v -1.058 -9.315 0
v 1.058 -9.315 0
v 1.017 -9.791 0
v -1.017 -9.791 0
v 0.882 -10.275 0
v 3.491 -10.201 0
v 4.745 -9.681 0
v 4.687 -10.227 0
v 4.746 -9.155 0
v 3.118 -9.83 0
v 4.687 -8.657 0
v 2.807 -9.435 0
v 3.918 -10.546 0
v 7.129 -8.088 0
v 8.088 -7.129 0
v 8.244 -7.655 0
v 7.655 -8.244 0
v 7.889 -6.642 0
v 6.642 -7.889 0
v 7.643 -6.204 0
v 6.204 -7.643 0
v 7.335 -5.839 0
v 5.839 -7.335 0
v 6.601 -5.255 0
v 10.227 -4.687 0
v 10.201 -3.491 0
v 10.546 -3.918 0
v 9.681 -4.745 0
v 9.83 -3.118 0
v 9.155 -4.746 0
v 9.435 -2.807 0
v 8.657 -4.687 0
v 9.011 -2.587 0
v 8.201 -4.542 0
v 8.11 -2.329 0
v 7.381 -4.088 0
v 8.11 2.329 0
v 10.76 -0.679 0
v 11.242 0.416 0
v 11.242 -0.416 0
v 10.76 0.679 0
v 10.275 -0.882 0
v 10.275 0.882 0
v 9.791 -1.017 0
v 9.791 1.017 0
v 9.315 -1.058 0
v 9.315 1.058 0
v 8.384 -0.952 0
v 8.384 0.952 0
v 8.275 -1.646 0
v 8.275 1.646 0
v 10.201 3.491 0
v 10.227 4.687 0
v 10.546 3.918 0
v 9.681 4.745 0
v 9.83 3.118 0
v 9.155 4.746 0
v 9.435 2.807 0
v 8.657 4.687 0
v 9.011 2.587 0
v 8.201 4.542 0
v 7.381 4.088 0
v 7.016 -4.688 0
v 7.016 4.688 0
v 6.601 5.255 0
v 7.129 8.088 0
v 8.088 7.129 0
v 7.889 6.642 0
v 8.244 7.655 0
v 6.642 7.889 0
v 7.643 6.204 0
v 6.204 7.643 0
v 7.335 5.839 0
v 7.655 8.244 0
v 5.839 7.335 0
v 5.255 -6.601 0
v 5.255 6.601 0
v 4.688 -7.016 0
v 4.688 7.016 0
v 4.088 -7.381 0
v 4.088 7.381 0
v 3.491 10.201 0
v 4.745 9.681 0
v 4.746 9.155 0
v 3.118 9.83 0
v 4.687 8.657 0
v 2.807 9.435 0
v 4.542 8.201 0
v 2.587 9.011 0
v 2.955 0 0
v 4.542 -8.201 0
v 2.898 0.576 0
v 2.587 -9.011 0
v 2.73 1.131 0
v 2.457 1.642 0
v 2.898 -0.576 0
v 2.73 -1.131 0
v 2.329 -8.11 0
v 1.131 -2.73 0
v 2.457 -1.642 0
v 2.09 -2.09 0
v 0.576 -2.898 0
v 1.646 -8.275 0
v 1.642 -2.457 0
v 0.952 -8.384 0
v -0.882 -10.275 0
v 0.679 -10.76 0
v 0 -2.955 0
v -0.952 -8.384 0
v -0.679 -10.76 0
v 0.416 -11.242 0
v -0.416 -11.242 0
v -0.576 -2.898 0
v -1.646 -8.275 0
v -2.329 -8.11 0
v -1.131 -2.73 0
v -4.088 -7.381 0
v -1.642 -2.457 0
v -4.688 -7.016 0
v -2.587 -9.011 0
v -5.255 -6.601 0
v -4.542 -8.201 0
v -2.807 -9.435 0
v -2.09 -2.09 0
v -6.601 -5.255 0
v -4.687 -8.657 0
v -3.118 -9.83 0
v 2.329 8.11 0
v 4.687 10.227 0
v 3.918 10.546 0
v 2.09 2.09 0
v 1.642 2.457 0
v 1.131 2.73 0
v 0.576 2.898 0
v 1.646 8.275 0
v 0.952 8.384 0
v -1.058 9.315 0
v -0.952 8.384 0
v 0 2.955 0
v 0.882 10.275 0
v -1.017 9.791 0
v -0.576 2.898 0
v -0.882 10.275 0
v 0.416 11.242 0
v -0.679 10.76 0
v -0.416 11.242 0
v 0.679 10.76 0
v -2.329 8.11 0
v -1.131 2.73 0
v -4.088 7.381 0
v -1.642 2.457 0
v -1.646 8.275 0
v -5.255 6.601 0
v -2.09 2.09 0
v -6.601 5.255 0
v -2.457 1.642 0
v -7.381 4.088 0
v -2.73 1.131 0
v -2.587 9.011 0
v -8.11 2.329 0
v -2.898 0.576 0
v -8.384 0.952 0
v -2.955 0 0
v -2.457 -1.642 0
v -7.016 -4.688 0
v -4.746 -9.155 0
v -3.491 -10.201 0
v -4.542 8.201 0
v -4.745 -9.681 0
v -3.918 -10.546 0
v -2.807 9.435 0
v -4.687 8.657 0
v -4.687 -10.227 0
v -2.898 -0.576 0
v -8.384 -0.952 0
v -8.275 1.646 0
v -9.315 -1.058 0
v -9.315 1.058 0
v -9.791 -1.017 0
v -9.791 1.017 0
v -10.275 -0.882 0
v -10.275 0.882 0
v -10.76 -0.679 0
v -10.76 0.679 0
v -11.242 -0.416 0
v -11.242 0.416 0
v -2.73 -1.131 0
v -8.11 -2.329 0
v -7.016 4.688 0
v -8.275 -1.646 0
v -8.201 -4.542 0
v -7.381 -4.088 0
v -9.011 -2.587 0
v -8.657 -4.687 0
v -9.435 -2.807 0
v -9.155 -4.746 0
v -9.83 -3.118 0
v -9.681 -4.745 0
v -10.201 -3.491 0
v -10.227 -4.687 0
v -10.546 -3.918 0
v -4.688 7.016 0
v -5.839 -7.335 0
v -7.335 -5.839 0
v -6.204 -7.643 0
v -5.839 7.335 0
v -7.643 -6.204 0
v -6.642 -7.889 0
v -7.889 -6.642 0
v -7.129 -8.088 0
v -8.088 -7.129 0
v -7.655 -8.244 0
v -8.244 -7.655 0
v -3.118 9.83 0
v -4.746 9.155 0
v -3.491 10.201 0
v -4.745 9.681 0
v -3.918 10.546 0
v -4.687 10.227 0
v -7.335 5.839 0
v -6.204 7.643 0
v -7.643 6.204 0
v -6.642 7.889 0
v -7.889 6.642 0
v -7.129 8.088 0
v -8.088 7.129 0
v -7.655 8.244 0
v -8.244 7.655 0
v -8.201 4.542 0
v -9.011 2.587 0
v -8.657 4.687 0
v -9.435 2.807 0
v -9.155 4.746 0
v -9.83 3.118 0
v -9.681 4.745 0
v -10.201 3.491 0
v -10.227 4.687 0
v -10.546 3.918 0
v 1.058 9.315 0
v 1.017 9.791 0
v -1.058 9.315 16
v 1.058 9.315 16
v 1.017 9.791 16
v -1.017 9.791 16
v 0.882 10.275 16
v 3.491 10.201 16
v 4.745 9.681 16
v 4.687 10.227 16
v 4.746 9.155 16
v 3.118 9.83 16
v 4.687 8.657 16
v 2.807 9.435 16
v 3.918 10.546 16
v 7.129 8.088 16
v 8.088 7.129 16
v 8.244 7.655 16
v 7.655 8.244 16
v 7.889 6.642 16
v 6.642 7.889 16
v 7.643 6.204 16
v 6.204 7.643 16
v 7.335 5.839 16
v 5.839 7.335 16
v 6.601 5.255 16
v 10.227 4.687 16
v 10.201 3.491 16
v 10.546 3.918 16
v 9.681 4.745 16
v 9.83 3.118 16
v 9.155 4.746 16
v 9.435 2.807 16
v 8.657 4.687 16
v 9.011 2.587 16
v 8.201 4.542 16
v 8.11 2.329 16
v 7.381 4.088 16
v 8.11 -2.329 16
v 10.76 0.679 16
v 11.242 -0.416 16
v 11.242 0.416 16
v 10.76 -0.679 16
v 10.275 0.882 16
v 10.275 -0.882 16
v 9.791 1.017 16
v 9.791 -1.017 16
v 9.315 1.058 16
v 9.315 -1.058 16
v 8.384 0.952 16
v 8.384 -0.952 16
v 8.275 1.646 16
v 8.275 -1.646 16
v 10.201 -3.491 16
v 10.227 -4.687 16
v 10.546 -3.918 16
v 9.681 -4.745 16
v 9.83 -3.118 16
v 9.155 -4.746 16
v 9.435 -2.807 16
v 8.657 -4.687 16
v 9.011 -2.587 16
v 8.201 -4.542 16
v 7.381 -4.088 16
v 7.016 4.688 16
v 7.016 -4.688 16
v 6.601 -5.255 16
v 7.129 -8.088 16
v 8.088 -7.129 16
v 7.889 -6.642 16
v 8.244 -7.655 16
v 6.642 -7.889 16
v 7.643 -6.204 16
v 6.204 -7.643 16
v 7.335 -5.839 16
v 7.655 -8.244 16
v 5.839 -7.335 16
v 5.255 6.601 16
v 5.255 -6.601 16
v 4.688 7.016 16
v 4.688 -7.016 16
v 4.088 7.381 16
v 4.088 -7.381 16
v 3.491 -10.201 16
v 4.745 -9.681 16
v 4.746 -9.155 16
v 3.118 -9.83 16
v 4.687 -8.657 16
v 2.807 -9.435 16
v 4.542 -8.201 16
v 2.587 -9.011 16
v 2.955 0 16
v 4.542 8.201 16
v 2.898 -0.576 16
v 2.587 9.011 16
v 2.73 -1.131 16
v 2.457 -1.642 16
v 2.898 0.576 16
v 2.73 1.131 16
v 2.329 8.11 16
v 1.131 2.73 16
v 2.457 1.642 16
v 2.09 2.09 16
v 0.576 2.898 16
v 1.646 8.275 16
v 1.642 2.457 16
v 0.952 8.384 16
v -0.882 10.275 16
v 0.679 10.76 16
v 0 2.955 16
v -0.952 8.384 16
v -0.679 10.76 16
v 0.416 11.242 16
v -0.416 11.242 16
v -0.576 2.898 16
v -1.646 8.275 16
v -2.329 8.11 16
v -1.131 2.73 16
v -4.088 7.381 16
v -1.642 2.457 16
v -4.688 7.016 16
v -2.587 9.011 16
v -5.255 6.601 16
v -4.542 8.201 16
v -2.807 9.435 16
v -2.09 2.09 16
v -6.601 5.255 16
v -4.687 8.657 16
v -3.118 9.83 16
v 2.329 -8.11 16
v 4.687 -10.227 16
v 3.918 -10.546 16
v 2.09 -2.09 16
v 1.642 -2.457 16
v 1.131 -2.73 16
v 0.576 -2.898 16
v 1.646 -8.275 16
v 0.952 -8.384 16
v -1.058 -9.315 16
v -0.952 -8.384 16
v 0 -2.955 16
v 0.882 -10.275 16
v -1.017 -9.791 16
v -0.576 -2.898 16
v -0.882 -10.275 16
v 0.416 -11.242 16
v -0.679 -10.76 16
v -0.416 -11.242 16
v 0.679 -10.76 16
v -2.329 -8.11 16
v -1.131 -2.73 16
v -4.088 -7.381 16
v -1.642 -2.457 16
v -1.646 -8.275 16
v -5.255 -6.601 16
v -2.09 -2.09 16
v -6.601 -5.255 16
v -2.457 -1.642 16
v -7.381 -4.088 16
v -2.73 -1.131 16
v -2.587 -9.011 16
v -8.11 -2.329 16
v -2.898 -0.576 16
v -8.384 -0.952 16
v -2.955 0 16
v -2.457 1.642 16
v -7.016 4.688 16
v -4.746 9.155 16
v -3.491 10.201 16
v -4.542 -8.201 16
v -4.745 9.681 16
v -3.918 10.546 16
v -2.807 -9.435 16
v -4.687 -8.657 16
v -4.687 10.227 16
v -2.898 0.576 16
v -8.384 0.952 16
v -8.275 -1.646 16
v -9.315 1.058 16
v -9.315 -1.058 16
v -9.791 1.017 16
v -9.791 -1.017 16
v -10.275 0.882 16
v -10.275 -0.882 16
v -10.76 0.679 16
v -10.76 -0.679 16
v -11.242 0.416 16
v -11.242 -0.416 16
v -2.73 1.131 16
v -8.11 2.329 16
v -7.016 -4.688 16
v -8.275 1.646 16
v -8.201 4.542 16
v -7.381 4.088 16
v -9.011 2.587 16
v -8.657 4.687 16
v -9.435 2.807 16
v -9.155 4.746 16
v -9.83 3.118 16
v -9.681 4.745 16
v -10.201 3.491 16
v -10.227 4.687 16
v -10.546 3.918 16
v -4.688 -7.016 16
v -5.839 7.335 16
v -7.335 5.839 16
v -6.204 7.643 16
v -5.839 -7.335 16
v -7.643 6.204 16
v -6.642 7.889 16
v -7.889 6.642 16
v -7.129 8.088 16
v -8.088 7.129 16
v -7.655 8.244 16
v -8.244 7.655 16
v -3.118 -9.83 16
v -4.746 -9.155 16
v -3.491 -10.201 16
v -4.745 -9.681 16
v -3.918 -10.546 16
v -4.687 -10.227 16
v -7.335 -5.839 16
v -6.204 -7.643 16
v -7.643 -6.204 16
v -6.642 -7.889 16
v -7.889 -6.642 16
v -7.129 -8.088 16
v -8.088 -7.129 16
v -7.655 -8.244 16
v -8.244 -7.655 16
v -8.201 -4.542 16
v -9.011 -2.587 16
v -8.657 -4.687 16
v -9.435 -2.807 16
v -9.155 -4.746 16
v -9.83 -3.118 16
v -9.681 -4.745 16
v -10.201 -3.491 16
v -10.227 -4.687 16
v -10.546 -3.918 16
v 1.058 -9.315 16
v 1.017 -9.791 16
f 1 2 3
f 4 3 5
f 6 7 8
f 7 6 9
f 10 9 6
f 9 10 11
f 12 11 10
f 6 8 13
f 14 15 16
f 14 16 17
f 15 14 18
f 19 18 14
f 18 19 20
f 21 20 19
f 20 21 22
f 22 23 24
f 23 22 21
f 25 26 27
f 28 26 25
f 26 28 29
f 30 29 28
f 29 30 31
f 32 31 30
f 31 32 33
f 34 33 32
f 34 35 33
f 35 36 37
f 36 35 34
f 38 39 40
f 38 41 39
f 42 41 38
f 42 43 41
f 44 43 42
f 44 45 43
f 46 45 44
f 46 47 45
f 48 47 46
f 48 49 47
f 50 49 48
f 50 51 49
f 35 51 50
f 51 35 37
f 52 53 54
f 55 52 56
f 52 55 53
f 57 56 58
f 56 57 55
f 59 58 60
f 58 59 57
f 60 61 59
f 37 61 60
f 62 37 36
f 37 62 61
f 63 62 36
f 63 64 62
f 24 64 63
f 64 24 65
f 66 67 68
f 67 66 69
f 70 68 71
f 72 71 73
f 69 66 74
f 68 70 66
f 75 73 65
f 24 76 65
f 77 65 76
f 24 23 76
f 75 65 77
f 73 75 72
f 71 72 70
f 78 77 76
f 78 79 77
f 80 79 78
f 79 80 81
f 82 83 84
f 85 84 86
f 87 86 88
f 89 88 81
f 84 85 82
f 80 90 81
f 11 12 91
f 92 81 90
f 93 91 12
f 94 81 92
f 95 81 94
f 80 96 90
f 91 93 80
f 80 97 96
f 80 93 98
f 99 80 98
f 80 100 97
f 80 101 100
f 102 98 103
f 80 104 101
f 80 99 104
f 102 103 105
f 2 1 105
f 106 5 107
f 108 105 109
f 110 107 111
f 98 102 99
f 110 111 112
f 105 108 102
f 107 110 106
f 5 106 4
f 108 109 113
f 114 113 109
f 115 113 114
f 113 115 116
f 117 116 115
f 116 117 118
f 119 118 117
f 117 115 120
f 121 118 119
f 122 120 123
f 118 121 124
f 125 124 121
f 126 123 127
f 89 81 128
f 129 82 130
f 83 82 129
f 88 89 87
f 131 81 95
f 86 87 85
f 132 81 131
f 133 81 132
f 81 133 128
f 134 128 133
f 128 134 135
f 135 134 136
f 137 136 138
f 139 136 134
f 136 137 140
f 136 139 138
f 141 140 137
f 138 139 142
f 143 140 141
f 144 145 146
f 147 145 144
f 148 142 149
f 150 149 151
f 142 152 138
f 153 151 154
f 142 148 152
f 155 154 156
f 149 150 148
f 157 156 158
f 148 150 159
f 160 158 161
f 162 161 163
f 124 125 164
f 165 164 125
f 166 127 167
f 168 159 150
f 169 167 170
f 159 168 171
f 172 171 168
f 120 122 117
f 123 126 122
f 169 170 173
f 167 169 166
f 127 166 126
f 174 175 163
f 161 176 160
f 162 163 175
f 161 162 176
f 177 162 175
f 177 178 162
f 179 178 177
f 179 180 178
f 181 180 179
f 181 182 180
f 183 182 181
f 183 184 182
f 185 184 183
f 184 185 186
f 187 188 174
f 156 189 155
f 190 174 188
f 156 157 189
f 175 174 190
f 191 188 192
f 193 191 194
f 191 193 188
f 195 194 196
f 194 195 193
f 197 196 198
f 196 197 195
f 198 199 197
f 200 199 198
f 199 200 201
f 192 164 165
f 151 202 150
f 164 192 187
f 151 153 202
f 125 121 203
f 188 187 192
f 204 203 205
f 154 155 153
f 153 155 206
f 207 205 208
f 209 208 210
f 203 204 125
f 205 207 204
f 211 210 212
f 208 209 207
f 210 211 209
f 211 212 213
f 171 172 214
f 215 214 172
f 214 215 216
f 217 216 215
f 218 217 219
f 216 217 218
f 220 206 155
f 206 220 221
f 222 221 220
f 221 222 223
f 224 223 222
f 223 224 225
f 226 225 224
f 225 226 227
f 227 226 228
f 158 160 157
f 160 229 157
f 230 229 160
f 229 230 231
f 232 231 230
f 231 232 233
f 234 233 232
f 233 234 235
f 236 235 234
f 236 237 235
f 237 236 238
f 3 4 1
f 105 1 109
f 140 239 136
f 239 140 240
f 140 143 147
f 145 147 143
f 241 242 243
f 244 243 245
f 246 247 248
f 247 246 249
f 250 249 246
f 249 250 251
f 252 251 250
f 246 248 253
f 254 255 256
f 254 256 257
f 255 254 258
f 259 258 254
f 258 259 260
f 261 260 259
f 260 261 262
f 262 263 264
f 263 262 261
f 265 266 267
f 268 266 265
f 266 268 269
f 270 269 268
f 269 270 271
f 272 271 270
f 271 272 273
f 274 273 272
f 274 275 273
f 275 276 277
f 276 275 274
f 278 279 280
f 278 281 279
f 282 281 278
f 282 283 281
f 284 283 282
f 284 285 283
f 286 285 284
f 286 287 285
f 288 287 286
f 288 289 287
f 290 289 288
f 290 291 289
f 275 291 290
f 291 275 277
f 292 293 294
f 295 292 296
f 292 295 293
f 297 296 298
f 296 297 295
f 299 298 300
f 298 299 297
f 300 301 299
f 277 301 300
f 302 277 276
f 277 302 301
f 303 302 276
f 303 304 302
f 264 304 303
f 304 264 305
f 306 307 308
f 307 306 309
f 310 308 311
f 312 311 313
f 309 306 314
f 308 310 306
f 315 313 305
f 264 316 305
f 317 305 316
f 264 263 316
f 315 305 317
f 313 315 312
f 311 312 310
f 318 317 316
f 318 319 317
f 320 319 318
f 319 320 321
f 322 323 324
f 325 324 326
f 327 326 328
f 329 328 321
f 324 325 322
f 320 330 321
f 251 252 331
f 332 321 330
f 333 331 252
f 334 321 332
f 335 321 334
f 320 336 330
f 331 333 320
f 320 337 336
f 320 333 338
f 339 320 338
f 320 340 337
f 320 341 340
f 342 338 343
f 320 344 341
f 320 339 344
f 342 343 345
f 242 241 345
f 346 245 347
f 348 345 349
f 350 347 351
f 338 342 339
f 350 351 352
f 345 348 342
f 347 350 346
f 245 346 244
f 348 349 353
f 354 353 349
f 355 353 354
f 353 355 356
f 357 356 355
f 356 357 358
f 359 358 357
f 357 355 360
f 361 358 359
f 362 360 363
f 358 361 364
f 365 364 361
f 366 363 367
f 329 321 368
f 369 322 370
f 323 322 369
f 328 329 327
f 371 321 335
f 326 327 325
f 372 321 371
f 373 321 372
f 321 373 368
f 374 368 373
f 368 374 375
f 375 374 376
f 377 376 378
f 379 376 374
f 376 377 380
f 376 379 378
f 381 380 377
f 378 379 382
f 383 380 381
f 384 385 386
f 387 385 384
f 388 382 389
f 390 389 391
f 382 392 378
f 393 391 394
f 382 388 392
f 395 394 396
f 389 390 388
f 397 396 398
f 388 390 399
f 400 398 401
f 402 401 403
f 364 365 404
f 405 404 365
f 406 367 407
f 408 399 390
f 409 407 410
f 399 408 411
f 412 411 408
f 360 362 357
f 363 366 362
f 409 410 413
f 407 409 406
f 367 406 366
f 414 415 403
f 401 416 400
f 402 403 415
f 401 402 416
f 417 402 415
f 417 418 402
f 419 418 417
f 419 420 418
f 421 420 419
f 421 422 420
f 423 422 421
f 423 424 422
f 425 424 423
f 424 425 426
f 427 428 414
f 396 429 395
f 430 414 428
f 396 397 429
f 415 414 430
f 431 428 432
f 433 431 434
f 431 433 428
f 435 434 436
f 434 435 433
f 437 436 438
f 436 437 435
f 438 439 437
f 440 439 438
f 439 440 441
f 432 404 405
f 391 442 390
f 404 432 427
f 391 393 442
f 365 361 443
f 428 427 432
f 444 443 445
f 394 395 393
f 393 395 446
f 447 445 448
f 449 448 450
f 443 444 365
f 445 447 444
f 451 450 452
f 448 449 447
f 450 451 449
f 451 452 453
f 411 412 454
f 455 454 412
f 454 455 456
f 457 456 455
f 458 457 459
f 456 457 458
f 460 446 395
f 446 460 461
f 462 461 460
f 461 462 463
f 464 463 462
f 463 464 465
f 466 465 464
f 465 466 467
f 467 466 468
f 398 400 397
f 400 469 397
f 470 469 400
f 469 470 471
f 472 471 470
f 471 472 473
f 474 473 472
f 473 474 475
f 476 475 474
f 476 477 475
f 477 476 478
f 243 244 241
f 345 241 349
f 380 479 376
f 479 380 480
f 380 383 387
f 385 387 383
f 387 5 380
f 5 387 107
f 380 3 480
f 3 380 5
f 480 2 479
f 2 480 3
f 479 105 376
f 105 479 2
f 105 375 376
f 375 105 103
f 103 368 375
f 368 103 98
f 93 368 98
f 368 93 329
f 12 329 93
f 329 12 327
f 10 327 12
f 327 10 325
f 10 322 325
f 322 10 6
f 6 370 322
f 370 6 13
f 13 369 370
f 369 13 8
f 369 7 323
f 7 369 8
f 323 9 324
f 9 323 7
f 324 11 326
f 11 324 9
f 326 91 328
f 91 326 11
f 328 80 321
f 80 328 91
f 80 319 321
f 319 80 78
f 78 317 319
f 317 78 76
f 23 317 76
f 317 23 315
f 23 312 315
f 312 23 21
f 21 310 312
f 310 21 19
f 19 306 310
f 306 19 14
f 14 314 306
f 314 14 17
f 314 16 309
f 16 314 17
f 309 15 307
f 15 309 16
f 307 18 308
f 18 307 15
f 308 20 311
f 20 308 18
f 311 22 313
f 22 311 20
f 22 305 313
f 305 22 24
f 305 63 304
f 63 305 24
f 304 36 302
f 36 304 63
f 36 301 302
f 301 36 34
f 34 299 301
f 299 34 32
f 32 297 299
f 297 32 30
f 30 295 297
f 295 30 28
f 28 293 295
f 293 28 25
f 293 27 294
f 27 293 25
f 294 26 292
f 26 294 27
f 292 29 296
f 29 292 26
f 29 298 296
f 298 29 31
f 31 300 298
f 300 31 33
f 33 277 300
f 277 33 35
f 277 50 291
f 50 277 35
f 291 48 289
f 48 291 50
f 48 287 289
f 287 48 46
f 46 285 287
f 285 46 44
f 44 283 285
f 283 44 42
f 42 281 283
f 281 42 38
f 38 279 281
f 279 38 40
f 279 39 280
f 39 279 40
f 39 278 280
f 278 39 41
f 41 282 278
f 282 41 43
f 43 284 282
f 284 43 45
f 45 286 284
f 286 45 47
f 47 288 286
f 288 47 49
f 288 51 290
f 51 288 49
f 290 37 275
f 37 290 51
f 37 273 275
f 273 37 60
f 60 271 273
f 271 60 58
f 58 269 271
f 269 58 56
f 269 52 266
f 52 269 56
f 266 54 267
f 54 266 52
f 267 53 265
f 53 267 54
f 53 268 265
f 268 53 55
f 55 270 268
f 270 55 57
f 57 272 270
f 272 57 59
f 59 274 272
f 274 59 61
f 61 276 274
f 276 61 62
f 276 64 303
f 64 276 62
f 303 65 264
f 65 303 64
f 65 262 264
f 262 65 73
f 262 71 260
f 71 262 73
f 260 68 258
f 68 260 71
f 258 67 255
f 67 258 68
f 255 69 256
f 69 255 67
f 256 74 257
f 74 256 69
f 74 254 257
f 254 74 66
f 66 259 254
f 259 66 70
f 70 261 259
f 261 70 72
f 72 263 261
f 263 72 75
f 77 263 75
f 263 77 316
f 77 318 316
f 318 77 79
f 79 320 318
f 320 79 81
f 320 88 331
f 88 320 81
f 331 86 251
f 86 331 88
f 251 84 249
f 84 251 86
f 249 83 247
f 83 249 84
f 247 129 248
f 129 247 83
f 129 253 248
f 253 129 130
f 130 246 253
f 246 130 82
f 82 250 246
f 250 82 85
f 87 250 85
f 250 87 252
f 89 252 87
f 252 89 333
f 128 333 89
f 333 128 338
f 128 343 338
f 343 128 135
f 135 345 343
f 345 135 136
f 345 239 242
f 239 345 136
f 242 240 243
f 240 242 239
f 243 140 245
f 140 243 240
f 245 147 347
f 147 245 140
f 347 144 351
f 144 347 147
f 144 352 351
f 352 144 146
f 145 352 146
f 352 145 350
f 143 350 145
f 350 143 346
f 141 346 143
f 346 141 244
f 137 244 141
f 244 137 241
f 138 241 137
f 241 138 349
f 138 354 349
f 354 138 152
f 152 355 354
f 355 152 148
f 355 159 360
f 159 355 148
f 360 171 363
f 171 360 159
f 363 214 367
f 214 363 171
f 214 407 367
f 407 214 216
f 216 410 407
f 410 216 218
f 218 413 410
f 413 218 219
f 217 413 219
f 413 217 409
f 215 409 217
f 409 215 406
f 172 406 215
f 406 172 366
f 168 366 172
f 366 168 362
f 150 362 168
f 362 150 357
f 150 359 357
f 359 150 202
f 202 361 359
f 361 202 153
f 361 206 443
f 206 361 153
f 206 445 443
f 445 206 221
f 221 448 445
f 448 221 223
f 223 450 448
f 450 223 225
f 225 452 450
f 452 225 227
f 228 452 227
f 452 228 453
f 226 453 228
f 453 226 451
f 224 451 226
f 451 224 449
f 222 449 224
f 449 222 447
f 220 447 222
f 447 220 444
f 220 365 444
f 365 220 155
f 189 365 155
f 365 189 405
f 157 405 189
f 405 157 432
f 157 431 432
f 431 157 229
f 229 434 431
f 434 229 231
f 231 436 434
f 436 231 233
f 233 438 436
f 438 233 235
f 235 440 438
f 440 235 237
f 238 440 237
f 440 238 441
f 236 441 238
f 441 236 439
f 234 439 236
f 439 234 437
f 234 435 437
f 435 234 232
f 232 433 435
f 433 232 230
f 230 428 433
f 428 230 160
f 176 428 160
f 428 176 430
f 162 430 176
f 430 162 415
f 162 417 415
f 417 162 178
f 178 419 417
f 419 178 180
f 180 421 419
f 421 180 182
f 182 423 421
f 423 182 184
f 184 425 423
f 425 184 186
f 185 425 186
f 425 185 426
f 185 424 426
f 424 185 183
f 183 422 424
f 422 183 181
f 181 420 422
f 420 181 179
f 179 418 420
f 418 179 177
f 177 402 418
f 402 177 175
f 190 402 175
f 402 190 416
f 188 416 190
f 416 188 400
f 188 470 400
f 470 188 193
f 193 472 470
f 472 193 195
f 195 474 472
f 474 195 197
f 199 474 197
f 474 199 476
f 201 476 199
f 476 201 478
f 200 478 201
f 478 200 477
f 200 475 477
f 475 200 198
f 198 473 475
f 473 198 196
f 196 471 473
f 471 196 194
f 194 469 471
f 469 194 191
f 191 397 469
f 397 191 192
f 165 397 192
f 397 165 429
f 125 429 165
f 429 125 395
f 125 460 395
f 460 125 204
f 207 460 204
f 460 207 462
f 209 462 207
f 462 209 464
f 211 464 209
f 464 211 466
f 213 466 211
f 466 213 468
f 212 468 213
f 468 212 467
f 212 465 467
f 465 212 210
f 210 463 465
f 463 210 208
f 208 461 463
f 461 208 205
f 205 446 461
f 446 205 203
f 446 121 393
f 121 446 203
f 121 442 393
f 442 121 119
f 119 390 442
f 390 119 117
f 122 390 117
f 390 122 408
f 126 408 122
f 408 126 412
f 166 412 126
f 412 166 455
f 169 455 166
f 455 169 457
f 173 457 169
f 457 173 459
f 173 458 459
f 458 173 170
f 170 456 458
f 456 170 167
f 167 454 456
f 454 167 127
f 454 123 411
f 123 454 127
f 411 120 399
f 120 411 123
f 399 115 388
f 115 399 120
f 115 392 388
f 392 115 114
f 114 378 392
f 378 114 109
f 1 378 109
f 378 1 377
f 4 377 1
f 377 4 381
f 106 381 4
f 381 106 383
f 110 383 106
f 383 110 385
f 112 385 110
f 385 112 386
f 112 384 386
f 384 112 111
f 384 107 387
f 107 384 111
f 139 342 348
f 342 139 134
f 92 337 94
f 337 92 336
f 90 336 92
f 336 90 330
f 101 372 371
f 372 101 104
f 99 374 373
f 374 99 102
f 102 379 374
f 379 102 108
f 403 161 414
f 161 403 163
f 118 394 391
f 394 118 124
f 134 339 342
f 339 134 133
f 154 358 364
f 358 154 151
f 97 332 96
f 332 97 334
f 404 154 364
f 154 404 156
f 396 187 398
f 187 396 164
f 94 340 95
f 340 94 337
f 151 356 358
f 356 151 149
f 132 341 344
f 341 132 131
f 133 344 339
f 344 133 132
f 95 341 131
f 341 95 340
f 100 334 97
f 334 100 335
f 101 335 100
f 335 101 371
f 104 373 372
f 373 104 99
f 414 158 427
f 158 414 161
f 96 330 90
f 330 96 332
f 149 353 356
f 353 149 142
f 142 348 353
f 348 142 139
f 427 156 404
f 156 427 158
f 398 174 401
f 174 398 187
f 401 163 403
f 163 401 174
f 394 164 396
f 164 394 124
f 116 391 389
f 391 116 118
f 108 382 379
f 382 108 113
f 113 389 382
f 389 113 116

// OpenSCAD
$fn = 32;

// ----------------------------------------------------------------------
// Spur gear: m=1.25 z=16, 22.5 mm tip diameter x 16 mm
// ----------------------------------------------------------------------

// --- parameters (mm) ---
modul = 1.25;             // module
n_teeth = 16;             // number of teeth
width = 16;               // face width
pa = 20;                  // pressure angle, deg
shaft_d = 5.91;           // shaft bore

/* --- involute profile --- */
pitch_r = modul * n_teeth / 2;
base_r = pitch_r * cos(pa);
tip_r = pitch_r + modul;
root_r = pitch_r - 1.25 * modul;
flank_steps = 6;

function inv_deg(a) = (tan(a) - a * PI / 180) * 180 / PI;
function flank_r(i) = root_r + (tip_r - root_r) * i / flank_steps;
function half_angle(r) = 90 / n_teeth + inv_deg(pa) - inv_deg(acos(min(1, base_r / r)));
function tooth_pt(k, i, side) =
    let (r = flank_r(i), a = k * 360 / n_teeth + side * half_angle(r))
    [r * cos(a), r * sin(a)];

module tooth_profile() {
  polygon(points = [
    for (k = [0 : n_teeth - 1])
      each [
        for (i = [0 : flank_steps]) tooth_pt(k, i, -1),
        for (i = [flank_steps : -1 : 0]) tooth_pt(k, i, 1),
        let (ta = (k + 0.5) * 360 / n_teeth)
          [root_r * cos(ta), root_r * sin(ta)]
      ]
  ]);
}

module gear_disc() {
  linear_extrude(height = width) tooth_profile();
}

difference() {
  gear_disc();
  translate([0, 0, -1]) cylinder(h = width + 3, d = shaft_d);
}
